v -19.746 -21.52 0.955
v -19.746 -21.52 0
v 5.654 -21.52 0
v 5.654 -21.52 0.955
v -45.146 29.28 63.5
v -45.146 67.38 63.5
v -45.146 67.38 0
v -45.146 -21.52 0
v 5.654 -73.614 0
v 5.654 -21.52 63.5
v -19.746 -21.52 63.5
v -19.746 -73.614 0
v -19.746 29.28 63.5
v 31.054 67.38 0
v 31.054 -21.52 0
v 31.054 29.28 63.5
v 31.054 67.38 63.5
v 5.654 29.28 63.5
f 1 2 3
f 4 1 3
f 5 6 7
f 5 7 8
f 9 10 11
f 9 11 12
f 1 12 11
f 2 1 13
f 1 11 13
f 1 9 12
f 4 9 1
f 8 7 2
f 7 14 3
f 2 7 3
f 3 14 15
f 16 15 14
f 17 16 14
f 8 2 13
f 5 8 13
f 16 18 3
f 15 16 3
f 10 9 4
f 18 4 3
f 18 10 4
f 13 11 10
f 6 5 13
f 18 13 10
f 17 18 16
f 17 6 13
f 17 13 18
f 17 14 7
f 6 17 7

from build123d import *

# Parameters (mm, degrees)
F1_DEPTH = 63.5
F3_DEPTH = 25.4
F5_DEPTH = 25.4
F7_DEPTH = 25.4


with BuildPart() as f1:
    # F0 (on Top) → F1 (new body)
    with BuildSketch(Plane.XY):
        Polygon((31.054489, 67.379584), (-45.145511, 67.379584), (-45.145511, 29.279584), (-19.745511, 29.279584), (-19.745511, -21.520416), (5.654489, -21.520416), (5.654489, 29.279584), (31.054489, 29.279584), align=None)
    extrude(amount=F1_DEPTH)

    # F2 (on face) → F3 (join)
    with BuildSketch(Plane.YZ.offset(5.654489)):
        Polygon((29.279584, 0), (29.279584, 63.5), (-21.520416, 0), align=None)
    extrude(amount=F3_DEPTH)

    # F4 (on face) → F5 (join)
    with BuildSketch(Plane.YZ.offset(5.654489)):
        Polygon((-21.520416, 0.954785), (-21.520416, 63.5), (-73.614173, 0), align=None)
    extrude(amount=-F5_DEPTH)

    # F6 (on face) → F7 (join)
    with BuildSketch(Plane(origin=(-19.745511, 0, 0), x_dir=(0, -1, 0), z_dir=(-1, 0, 0))):
        Polygon((21.520416, 0), (-29.279584, 63.5), (-29.279584, 0), align=None)
    extrude(amount=F7_DEPTH)


solid = f1.part
